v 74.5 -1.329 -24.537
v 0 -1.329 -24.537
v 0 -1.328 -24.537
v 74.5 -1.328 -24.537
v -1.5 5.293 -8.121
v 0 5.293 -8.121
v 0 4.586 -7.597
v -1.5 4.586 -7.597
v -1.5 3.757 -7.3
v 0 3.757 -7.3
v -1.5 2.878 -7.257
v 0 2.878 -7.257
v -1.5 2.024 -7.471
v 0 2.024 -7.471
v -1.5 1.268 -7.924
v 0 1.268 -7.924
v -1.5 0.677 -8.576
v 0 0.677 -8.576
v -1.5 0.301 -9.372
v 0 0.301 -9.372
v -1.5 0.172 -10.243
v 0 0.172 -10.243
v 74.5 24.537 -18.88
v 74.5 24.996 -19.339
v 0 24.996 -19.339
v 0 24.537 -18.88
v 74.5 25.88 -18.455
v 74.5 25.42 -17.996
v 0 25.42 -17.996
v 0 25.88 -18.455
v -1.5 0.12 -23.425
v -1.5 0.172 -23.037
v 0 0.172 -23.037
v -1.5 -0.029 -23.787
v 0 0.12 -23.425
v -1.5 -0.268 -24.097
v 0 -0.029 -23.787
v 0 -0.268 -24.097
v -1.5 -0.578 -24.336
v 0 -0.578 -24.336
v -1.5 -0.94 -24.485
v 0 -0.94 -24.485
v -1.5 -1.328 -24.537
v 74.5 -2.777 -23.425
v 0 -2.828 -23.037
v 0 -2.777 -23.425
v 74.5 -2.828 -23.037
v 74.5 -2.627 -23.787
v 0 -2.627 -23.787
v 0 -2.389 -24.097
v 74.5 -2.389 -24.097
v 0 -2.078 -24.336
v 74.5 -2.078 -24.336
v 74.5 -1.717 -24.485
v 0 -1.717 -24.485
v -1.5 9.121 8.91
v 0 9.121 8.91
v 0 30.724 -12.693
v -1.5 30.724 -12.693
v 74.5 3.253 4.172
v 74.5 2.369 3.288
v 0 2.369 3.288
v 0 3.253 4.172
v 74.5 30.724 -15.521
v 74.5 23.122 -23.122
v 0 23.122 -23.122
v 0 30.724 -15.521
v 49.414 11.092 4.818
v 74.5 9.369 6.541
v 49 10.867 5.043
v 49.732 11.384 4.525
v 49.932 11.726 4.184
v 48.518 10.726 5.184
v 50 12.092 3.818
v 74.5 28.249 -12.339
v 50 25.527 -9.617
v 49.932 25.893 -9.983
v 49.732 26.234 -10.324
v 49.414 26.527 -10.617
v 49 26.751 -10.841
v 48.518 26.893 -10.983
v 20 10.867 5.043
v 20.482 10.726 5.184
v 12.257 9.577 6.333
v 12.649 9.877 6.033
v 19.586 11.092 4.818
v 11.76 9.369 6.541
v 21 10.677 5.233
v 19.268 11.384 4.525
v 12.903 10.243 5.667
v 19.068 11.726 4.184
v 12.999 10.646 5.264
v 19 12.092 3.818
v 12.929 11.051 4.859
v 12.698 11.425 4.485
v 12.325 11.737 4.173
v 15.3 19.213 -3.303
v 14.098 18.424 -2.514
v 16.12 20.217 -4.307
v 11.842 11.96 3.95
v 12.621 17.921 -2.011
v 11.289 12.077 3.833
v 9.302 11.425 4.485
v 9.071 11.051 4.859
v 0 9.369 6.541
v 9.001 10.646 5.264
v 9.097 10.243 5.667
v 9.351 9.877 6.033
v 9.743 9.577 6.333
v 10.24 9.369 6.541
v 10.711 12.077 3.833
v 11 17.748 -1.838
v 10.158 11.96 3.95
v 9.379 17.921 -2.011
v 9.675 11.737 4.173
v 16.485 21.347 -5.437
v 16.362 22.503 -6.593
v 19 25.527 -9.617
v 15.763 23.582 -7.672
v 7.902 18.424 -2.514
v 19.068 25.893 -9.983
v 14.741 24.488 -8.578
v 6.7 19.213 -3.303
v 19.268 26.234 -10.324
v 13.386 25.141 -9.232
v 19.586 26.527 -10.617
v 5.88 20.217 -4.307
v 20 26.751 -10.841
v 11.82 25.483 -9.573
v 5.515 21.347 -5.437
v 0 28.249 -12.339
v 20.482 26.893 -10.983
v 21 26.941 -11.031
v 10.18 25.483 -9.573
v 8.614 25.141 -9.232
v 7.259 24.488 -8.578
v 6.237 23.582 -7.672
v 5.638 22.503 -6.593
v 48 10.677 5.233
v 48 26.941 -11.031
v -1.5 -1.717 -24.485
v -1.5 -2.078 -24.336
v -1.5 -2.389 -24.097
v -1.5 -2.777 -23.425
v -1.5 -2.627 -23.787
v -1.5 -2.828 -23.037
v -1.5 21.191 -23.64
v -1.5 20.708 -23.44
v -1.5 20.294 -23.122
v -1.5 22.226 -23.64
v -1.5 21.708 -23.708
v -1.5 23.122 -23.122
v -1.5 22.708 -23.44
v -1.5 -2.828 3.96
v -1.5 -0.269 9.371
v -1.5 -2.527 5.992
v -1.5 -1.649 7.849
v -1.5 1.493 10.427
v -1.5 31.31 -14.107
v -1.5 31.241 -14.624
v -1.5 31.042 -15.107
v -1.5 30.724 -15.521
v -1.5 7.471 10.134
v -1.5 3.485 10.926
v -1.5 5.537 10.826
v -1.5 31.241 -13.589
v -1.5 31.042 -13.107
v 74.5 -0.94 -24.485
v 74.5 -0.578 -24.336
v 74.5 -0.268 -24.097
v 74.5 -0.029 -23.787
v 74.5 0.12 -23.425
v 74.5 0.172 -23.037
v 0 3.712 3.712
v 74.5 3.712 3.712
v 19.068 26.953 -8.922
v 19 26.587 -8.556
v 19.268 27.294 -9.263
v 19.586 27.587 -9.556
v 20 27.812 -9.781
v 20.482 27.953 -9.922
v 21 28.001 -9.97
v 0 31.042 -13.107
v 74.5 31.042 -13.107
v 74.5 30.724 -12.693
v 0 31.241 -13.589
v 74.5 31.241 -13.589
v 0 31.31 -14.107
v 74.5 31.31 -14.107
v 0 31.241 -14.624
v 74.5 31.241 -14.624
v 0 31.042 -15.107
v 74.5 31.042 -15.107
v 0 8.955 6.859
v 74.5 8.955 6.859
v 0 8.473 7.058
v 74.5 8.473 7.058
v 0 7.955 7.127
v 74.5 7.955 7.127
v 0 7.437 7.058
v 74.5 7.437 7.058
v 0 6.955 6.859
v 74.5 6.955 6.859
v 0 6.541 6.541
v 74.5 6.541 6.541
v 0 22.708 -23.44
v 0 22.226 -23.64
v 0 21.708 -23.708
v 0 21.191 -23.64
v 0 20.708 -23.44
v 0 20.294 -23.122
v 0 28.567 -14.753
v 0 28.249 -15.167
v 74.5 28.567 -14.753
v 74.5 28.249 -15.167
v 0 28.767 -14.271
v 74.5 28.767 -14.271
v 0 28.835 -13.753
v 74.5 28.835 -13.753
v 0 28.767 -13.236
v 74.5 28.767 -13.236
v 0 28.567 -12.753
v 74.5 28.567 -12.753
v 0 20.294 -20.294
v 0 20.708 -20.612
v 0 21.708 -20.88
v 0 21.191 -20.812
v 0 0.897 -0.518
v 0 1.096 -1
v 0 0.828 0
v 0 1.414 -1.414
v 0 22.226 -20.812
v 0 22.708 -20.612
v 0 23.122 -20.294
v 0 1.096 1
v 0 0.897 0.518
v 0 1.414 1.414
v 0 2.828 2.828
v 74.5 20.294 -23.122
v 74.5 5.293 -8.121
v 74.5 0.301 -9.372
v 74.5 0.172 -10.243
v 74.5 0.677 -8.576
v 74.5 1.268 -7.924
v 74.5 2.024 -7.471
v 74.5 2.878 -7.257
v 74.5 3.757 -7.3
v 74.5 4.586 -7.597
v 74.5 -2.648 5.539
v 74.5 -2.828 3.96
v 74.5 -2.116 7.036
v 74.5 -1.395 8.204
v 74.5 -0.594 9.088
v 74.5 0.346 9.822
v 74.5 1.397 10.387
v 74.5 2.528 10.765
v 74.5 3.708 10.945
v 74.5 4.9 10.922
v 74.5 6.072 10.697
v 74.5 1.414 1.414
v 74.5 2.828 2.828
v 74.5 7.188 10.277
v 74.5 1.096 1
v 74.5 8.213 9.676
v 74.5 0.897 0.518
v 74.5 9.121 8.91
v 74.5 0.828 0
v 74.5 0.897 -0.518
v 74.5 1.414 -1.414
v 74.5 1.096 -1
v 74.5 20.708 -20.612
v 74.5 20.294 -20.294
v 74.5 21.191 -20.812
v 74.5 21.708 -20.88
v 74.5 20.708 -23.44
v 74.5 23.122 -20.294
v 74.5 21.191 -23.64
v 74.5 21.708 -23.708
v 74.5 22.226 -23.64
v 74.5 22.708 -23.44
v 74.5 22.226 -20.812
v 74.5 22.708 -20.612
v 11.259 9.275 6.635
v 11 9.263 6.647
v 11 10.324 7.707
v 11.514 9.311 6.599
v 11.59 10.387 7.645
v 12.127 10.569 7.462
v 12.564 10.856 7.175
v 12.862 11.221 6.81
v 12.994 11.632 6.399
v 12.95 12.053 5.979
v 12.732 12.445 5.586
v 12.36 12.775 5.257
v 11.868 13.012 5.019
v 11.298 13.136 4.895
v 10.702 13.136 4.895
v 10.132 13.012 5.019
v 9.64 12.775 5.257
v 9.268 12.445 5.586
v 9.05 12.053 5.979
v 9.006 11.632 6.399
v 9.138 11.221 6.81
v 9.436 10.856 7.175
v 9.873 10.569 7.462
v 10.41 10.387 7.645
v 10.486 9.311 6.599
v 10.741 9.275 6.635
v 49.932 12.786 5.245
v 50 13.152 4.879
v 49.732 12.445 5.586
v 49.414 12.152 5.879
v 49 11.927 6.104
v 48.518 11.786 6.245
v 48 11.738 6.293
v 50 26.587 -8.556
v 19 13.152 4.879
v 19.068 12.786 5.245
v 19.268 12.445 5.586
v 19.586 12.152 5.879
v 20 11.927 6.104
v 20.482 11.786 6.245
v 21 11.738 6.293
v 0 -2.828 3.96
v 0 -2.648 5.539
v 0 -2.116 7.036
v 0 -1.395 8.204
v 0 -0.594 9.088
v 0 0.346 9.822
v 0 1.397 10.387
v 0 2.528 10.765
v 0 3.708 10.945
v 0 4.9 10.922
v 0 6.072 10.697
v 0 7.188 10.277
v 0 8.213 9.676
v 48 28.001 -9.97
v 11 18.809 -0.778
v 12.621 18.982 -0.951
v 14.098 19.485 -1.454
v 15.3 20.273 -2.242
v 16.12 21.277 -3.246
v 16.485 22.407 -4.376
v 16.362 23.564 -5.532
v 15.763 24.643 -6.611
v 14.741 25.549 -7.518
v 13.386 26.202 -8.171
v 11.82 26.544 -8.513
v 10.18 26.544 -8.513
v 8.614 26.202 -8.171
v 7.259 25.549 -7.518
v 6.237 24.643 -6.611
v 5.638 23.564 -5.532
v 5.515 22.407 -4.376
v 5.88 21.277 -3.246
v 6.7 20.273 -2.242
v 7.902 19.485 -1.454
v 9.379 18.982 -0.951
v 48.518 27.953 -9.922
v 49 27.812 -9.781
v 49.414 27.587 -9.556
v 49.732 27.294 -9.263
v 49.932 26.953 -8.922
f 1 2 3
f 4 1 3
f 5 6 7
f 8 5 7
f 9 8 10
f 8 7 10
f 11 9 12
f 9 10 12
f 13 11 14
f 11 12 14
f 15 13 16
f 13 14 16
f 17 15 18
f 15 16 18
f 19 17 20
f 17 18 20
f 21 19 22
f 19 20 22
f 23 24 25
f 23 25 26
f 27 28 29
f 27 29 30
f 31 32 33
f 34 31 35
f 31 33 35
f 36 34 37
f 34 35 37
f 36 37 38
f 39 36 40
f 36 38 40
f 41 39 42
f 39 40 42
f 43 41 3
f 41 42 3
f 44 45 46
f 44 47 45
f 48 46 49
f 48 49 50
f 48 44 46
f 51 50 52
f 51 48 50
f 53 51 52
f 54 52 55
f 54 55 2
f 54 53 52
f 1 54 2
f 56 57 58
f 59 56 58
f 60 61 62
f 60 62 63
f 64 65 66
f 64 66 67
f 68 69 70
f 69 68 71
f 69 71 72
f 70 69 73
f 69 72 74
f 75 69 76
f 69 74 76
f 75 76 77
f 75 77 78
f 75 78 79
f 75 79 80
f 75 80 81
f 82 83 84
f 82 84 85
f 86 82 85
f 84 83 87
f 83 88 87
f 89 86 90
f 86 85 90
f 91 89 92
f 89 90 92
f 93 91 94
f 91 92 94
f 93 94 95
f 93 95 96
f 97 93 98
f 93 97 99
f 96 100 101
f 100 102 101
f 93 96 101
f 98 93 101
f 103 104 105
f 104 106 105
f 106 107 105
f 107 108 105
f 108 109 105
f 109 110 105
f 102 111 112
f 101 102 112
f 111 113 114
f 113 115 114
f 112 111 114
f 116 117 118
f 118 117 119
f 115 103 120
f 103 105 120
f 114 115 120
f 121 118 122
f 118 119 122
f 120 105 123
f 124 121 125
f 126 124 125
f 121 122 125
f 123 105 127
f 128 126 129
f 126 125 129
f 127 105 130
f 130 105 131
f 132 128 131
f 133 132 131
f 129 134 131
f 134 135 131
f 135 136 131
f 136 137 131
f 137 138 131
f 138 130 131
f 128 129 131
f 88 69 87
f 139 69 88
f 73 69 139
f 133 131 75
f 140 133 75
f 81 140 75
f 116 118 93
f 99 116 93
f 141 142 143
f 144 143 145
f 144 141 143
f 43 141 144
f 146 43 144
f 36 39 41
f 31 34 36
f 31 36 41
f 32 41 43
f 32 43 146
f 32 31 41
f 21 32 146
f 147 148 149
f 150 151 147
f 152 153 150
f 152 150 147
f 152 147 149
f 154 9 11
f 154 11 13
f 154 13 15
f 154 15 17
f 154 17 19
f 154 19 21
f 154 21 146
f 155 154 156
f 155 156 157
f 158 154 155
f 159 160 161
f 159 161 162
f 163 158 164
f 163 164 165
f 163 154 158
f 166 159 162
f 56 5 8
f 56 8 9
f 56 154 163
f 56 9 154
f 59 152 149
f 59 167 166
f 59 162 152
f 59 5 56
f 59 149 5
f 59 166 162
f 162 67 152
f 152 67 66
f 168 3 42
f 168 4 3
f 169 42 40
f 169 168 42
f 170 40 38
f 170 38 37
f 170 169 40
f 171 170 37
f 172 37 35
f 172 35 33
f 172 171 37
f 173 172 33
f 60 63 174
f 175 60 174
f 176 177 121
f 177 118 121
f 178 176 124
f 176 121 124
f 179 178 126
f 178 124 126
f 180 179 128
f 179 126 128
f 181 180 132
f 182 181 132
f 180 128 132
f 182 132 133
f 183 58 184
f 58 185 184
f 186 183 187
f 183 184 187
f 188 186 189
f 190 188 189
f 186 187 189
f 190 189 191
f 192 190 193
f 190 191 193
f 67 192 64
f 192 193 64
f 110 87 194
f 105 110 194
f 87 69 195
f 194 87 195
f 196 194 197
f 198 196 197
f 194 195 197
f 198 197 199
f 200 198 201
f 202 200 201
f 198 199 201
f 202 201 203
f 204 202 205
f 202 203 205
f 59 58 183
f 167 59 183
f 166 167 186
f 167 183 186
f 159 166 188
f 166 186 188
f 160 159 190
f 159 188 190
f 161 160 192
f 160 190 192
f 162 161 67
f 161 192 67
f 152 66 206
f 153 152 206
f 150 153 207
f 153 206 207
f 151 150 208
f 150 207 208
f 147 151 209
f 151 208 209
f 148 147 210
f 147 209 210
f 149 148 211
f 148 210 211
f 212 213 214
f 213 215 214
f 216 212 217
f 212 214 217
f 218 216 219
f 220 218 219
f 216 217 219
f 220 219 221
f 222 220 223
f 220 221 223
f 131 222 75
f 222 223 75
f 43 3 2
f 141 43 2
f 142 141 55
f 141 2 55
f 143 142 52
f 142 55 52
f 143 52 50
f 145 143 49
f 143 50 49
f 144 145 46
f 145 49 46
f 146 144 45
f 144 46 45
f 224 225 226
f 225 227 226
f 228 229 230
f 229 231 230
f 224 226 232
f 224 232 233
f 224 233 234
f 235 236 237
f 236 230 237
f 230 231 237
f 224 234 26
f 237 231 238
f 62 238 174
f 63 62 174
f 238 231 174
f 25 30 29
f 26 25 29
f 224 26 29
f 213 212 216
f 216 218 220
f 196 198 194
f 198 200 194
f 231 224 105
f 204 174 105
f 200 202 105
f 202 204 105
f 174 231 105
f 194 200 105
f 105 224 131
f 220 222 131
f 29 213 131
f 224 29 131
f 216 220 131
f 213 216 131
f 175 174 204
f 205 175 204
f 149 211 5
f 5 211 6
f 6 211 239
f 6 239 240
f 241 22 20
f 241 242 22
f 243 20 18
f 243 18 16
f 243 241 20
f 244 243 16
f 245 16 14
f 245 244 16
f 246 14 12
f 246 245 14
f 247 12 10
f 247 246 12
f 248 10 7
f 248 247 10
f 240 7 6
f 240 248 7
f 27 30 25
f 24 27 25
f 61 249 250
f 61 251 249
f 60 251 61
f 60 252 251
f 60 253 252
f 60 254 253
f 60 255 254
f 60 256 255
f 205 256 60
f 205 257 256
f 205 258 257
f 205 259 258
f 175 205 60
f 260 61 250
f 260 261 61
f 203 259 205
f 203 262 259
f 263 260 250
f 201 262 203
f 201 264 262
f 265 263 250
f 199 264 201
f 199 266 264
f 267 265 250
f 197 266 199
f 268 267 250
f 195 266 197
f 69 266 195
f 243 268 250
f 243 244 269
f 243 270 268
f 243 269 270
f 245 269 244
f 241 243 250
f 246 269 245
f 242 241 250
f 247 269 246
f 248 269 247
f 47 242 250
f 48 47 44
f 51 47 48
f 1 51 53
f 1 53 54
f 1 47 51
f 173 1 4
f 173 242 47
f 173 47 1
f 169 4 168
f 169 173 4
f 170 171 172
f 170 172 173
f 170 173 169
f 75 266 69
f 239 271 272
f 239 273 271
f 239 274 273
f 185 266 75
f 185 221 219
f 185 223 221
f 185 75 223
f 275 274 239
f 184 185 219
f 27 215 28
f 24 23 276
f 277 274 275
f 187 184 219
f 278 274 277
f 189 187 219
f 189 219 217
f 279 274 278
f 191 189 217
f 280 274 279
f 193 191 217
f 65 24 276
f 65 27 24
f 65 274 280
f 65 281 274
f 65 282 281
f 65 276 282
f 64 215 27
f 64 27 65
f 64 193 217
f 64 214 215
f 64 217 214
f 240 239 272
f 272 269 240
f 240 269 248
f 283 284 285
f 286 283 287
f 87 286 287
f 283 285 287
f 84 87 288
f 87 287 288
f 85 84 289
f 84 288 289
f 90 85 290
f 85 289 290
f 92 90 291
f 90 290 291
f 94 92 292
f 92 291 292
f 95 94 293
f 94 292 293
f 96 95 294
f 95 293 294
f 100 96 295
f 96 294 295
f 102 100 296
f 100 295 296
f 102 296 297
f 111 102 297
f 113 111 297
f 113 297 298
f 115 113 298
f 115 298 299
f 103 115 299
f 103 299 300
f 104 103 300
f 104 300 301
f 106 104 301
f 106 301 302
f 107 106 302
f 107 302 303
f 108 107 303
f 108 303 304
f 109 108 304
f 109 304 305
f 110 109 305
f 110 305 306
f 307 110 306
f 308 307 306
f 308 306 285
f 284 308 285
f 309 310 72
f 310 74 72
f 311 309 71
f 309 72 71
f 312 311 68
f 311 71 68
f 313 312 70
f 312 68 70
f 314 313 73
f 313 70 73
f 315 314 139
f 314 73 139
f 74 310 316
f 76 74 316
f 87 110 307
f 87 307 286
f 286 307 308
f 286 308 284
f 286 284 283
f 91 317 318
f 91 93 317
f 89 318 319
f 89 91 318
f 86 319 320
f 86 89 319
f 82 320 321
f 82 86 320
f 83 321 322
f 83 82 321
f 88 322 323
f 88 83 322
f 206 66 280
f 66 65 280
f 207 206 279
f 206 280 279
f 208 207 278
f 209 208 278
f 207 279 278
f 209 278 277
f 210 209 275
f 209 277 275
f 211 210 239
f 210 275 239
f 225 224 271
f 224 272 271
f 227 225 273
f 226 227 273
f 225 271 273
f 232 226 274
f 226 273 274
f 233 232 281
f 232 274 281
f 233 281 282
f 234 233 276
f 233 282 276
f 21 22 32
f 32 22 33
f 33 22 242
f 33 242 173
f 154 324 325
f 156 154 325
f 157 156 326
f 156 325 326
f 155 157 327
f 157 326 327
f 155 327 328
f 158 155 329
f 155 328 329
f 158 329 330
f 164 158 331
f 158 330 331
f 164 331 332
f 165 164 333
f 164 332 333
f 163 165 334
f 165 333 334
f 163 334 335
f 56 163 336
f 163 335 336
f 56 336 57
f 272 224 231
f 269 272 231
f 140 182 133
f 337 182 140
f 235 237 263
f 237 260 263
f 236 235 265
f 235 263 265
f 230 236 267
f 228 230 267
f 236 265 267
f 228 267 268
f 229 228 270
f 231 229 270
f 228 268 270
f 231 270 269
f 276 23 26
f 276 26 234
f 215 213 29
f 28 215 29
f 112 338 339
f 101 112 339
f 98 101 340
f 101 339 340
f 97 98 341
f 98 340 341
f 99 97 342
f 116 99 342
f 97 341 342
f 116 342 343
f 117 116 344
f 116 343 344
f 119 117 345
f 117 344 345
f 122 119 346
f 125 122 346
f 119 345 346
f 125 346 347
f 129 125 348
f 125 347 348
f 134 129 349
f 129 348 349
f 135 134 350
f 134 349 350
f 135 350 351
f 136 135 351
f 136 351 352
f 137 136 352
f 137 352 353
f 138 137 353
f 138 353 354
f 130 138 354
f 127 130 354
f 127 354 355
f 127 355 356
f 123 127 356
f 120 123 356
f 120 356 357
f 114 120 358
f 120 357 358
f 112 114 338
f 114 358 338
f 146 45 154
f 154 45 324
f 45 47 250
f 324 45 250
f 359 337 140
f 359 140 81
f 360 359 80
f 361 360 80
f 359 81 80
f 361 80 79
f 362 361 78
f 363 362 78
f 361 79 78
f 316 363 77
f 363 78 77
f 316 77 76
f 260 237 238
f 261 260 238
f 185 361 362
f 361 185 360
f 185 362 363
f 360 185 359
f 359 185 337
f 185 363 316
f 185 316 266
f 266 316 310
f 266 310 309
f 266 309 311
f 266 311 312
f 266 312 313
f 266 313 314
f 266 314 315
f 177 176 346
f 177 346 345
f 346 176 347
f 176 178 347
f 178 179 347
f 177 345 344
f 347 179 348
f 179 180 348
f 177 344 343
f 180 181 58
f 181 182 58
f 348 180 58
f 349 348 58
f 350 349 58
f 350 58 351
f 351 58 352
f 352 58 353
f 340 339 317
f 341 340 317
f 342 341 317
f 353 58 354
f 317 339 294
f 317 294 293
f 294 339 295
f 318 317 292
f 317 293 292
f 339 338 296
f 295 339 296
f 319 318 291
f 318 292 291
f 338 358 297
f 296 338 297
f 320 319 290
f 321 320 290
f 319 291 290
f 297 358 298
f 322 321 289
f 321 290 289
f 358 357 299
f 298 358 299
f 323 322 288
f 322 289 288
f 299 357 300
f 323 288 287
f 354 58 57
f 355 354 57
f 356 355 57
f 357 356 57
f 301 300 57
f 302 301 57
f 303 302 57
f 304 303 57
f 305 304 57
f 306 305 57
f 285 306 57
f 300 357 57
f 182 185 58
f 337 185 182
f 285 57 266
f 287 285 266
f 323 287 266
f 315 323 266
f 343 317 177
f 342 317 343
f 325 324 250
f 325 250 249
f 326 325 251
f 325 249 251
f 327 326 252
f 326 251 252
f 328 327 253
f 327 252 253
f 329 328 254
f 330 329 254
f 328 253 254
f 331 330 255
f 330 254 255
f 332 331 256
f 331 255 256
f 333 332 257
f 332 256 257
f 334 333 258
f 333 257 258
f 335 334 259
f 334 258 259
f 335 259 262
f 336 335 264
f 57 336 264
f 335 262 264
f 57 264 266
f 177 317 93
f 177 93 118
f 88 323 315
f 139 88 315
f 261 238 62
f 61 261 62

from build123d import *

# Parameters (mm, degrees)
BOSS_EXTRUDE1_DEPTH = 74.5
FILLET1_R           = 7
FILLET2_R           = 2
FILLET3_R           = 1.5
FILLET4_R           = 3
SKETCH3_R           = 5.5
SKETCH3_R_2         = 2
SKETCH3_W           = 31
SKETCH3_H           = 23
CUT_EXTRUDE1_DEPTH  = 1.5
FILLET5_R           = 2
BOSS_EXTRUDE3_DEPTH = 1.5


with BuildPart() as part:
    # Sketch1 → Boss-Extrude1 (new body)
    with BuildSketch(Plane(origin=(0, 0, 0), x_dir=(0, 0, -1), z_dir=(1, 0, 0))):
        Polygon((-20.859650045, -2.828427125), (0, -2.828427125), (24.536605307, -2.828427125), (24.536605307, 0.171572875), (3, 0.171572875), (24.536605307, 21.708178182), (14.106780285, 32.138003205), (-10.429825023, 7.601397898), align=None)
        Polygon((19.339370465, 24.996224715), (18.879751058, 24.536605307), (21.708178182, 21.708178182), (0, 0), (-2.828427125, 2.828427125), (-3.288046533, 2.368807717), (-4.171930009, 3.252691193), (-3.712310601, 3.712310601), (-7.954951288, 7.954951288), (13.753226894, 29.663129471), (17.995867581, 25.420488784), (18.455486989, 25.880108191), align=None, mode=Mode.SUBTRACT)
    extrude(amount=BOSS_EXTRUDE1_DEPTH)

    # Fillet1
    fillet1_edges = [part.edges().sort_by_distance(p)[0] for p in [
        (37.25, -2.828427125, 20.859650045),
    ]]
    fillet(fillet1_edges, radius=FILLET1_R)

    # Fillet2
    fillet2_edges = [part.edges().sort_by_distance(p)[0] for p in [
        (37.25, 32.138003205, -14.106780285),
        (37.25, 21.708178182, -24.536605307),
        (37.25, 29.663129471, -13.753226894),
        (37.25, 7.954951288, 7.954951288),
        (37.25, 0, 0),
        (37.25, 21.708178182, -21.708178182),
    ]]
    fillet(fillet2_edges, radius=FILLET2_R)

    # Fillet3
    fillet3_edges = [part.edges().sort_by_distance(p)[0] for p in [
        (37.25, -2.828427125, -24.536605307),
        (37.25, 0.171572875, -24.536605307),
    ]]
    fillet(fillet3_edges, radius=FILLET3_R - 0.0001)  # a hair under: the kernel refuses the full size

    # Fillet4
    fillet4_edges = [part.edges().sort_by_distance(p)[0] for p in [
        (37.25, 0.171572875, -3),
    ]]
    fillet(fillet4_edges, radius=FILLET4_R)

    # Sketch3 → Cut-Extrude1 (cut)
    with BuildSketch(Plane(origin=(0, 9.01561146, 9.01561146), x_dir=(1, 0, 0), z_dir=(0, 0.7071067811865475, 0.7071067811865476))):
        with Locations(Location((11, 19.35, 0), (0, 0, 270))):
            Circle(SKETCH3_R)
        with Locations(Location((11, 3.85, 0), (0, 0, 270))):
            Circle(SKETCH3_R_2)
        with Locations((34.5, 15.35)):
            Rectangle(SKETCH3_W, SKETCH3_H)
    extrude(amount=-CUT_EXTRUDE1_DEPTH, mode=Mode.SUBTRACT)

    # Fillet5
    fillet5_edges = [part.edges().sort_by_distance(p)[0] for p in [
        (19, 11.207642482, 5.762920267),
        (19, 27.471098449, -10.500535701),
        (50, 27.471098449, -10.500535701),
        (50, 11.207642482, 5.762920267),
    ]]
    fillet(fillet5_edges, radius=FILLET5_R)

    # Sketch4 → Boss-Extrude3 (add)
    with BuildSketch(Plane.ZY):
        with BuildLine():
            Line((-23.036605307, -2.828427125), (3.960155108, -2.828427125))
            ThreePointArc((3.960155108, -2.828427125), (10.427311836, 1.492788849), (8.909902577, 9.121320344))
            Line((8.909902577, 9.121320344), (-12.692566722, 30.723789643))
            ThreePointArc((-12.692566722, 30.723789643), (-14.106780285, 31.30957608), (-15.520993847, 30.723789643))
            Line((-15.520993847, 30.723789643), (-23.122391745, 23.122391745))
            ThreePointArc((-23.122391745, 23.122391745), (-23.708178182, 21.708178182), (-23.122391745, 20.29396462))
            Line((-23.122391745, 20.29396462), (-8.121320344, 5.292893219))
            ThreePointArc((-8.121320344, 5.292893219), (-7.47100209, 2.023522578), (-10.242640687, 0.171572875))
            Line((-10.242640687, 0.171572875), (-23.036605307, 0.171572875))
            ThreePointArc((-23.036605307, 0.171572875), (-24.097265479, -0.267766953), (-24.536605307, -1.328427125))
            ThreePointArc((-24.536605307, -1.328427125), (-24.097265479, -2.389087297), (-23.036605307, -2.828427125))
        make_face()
    extrude(amount=BOSS_EXTRUDE3_DEPTH)


solid = part.part
